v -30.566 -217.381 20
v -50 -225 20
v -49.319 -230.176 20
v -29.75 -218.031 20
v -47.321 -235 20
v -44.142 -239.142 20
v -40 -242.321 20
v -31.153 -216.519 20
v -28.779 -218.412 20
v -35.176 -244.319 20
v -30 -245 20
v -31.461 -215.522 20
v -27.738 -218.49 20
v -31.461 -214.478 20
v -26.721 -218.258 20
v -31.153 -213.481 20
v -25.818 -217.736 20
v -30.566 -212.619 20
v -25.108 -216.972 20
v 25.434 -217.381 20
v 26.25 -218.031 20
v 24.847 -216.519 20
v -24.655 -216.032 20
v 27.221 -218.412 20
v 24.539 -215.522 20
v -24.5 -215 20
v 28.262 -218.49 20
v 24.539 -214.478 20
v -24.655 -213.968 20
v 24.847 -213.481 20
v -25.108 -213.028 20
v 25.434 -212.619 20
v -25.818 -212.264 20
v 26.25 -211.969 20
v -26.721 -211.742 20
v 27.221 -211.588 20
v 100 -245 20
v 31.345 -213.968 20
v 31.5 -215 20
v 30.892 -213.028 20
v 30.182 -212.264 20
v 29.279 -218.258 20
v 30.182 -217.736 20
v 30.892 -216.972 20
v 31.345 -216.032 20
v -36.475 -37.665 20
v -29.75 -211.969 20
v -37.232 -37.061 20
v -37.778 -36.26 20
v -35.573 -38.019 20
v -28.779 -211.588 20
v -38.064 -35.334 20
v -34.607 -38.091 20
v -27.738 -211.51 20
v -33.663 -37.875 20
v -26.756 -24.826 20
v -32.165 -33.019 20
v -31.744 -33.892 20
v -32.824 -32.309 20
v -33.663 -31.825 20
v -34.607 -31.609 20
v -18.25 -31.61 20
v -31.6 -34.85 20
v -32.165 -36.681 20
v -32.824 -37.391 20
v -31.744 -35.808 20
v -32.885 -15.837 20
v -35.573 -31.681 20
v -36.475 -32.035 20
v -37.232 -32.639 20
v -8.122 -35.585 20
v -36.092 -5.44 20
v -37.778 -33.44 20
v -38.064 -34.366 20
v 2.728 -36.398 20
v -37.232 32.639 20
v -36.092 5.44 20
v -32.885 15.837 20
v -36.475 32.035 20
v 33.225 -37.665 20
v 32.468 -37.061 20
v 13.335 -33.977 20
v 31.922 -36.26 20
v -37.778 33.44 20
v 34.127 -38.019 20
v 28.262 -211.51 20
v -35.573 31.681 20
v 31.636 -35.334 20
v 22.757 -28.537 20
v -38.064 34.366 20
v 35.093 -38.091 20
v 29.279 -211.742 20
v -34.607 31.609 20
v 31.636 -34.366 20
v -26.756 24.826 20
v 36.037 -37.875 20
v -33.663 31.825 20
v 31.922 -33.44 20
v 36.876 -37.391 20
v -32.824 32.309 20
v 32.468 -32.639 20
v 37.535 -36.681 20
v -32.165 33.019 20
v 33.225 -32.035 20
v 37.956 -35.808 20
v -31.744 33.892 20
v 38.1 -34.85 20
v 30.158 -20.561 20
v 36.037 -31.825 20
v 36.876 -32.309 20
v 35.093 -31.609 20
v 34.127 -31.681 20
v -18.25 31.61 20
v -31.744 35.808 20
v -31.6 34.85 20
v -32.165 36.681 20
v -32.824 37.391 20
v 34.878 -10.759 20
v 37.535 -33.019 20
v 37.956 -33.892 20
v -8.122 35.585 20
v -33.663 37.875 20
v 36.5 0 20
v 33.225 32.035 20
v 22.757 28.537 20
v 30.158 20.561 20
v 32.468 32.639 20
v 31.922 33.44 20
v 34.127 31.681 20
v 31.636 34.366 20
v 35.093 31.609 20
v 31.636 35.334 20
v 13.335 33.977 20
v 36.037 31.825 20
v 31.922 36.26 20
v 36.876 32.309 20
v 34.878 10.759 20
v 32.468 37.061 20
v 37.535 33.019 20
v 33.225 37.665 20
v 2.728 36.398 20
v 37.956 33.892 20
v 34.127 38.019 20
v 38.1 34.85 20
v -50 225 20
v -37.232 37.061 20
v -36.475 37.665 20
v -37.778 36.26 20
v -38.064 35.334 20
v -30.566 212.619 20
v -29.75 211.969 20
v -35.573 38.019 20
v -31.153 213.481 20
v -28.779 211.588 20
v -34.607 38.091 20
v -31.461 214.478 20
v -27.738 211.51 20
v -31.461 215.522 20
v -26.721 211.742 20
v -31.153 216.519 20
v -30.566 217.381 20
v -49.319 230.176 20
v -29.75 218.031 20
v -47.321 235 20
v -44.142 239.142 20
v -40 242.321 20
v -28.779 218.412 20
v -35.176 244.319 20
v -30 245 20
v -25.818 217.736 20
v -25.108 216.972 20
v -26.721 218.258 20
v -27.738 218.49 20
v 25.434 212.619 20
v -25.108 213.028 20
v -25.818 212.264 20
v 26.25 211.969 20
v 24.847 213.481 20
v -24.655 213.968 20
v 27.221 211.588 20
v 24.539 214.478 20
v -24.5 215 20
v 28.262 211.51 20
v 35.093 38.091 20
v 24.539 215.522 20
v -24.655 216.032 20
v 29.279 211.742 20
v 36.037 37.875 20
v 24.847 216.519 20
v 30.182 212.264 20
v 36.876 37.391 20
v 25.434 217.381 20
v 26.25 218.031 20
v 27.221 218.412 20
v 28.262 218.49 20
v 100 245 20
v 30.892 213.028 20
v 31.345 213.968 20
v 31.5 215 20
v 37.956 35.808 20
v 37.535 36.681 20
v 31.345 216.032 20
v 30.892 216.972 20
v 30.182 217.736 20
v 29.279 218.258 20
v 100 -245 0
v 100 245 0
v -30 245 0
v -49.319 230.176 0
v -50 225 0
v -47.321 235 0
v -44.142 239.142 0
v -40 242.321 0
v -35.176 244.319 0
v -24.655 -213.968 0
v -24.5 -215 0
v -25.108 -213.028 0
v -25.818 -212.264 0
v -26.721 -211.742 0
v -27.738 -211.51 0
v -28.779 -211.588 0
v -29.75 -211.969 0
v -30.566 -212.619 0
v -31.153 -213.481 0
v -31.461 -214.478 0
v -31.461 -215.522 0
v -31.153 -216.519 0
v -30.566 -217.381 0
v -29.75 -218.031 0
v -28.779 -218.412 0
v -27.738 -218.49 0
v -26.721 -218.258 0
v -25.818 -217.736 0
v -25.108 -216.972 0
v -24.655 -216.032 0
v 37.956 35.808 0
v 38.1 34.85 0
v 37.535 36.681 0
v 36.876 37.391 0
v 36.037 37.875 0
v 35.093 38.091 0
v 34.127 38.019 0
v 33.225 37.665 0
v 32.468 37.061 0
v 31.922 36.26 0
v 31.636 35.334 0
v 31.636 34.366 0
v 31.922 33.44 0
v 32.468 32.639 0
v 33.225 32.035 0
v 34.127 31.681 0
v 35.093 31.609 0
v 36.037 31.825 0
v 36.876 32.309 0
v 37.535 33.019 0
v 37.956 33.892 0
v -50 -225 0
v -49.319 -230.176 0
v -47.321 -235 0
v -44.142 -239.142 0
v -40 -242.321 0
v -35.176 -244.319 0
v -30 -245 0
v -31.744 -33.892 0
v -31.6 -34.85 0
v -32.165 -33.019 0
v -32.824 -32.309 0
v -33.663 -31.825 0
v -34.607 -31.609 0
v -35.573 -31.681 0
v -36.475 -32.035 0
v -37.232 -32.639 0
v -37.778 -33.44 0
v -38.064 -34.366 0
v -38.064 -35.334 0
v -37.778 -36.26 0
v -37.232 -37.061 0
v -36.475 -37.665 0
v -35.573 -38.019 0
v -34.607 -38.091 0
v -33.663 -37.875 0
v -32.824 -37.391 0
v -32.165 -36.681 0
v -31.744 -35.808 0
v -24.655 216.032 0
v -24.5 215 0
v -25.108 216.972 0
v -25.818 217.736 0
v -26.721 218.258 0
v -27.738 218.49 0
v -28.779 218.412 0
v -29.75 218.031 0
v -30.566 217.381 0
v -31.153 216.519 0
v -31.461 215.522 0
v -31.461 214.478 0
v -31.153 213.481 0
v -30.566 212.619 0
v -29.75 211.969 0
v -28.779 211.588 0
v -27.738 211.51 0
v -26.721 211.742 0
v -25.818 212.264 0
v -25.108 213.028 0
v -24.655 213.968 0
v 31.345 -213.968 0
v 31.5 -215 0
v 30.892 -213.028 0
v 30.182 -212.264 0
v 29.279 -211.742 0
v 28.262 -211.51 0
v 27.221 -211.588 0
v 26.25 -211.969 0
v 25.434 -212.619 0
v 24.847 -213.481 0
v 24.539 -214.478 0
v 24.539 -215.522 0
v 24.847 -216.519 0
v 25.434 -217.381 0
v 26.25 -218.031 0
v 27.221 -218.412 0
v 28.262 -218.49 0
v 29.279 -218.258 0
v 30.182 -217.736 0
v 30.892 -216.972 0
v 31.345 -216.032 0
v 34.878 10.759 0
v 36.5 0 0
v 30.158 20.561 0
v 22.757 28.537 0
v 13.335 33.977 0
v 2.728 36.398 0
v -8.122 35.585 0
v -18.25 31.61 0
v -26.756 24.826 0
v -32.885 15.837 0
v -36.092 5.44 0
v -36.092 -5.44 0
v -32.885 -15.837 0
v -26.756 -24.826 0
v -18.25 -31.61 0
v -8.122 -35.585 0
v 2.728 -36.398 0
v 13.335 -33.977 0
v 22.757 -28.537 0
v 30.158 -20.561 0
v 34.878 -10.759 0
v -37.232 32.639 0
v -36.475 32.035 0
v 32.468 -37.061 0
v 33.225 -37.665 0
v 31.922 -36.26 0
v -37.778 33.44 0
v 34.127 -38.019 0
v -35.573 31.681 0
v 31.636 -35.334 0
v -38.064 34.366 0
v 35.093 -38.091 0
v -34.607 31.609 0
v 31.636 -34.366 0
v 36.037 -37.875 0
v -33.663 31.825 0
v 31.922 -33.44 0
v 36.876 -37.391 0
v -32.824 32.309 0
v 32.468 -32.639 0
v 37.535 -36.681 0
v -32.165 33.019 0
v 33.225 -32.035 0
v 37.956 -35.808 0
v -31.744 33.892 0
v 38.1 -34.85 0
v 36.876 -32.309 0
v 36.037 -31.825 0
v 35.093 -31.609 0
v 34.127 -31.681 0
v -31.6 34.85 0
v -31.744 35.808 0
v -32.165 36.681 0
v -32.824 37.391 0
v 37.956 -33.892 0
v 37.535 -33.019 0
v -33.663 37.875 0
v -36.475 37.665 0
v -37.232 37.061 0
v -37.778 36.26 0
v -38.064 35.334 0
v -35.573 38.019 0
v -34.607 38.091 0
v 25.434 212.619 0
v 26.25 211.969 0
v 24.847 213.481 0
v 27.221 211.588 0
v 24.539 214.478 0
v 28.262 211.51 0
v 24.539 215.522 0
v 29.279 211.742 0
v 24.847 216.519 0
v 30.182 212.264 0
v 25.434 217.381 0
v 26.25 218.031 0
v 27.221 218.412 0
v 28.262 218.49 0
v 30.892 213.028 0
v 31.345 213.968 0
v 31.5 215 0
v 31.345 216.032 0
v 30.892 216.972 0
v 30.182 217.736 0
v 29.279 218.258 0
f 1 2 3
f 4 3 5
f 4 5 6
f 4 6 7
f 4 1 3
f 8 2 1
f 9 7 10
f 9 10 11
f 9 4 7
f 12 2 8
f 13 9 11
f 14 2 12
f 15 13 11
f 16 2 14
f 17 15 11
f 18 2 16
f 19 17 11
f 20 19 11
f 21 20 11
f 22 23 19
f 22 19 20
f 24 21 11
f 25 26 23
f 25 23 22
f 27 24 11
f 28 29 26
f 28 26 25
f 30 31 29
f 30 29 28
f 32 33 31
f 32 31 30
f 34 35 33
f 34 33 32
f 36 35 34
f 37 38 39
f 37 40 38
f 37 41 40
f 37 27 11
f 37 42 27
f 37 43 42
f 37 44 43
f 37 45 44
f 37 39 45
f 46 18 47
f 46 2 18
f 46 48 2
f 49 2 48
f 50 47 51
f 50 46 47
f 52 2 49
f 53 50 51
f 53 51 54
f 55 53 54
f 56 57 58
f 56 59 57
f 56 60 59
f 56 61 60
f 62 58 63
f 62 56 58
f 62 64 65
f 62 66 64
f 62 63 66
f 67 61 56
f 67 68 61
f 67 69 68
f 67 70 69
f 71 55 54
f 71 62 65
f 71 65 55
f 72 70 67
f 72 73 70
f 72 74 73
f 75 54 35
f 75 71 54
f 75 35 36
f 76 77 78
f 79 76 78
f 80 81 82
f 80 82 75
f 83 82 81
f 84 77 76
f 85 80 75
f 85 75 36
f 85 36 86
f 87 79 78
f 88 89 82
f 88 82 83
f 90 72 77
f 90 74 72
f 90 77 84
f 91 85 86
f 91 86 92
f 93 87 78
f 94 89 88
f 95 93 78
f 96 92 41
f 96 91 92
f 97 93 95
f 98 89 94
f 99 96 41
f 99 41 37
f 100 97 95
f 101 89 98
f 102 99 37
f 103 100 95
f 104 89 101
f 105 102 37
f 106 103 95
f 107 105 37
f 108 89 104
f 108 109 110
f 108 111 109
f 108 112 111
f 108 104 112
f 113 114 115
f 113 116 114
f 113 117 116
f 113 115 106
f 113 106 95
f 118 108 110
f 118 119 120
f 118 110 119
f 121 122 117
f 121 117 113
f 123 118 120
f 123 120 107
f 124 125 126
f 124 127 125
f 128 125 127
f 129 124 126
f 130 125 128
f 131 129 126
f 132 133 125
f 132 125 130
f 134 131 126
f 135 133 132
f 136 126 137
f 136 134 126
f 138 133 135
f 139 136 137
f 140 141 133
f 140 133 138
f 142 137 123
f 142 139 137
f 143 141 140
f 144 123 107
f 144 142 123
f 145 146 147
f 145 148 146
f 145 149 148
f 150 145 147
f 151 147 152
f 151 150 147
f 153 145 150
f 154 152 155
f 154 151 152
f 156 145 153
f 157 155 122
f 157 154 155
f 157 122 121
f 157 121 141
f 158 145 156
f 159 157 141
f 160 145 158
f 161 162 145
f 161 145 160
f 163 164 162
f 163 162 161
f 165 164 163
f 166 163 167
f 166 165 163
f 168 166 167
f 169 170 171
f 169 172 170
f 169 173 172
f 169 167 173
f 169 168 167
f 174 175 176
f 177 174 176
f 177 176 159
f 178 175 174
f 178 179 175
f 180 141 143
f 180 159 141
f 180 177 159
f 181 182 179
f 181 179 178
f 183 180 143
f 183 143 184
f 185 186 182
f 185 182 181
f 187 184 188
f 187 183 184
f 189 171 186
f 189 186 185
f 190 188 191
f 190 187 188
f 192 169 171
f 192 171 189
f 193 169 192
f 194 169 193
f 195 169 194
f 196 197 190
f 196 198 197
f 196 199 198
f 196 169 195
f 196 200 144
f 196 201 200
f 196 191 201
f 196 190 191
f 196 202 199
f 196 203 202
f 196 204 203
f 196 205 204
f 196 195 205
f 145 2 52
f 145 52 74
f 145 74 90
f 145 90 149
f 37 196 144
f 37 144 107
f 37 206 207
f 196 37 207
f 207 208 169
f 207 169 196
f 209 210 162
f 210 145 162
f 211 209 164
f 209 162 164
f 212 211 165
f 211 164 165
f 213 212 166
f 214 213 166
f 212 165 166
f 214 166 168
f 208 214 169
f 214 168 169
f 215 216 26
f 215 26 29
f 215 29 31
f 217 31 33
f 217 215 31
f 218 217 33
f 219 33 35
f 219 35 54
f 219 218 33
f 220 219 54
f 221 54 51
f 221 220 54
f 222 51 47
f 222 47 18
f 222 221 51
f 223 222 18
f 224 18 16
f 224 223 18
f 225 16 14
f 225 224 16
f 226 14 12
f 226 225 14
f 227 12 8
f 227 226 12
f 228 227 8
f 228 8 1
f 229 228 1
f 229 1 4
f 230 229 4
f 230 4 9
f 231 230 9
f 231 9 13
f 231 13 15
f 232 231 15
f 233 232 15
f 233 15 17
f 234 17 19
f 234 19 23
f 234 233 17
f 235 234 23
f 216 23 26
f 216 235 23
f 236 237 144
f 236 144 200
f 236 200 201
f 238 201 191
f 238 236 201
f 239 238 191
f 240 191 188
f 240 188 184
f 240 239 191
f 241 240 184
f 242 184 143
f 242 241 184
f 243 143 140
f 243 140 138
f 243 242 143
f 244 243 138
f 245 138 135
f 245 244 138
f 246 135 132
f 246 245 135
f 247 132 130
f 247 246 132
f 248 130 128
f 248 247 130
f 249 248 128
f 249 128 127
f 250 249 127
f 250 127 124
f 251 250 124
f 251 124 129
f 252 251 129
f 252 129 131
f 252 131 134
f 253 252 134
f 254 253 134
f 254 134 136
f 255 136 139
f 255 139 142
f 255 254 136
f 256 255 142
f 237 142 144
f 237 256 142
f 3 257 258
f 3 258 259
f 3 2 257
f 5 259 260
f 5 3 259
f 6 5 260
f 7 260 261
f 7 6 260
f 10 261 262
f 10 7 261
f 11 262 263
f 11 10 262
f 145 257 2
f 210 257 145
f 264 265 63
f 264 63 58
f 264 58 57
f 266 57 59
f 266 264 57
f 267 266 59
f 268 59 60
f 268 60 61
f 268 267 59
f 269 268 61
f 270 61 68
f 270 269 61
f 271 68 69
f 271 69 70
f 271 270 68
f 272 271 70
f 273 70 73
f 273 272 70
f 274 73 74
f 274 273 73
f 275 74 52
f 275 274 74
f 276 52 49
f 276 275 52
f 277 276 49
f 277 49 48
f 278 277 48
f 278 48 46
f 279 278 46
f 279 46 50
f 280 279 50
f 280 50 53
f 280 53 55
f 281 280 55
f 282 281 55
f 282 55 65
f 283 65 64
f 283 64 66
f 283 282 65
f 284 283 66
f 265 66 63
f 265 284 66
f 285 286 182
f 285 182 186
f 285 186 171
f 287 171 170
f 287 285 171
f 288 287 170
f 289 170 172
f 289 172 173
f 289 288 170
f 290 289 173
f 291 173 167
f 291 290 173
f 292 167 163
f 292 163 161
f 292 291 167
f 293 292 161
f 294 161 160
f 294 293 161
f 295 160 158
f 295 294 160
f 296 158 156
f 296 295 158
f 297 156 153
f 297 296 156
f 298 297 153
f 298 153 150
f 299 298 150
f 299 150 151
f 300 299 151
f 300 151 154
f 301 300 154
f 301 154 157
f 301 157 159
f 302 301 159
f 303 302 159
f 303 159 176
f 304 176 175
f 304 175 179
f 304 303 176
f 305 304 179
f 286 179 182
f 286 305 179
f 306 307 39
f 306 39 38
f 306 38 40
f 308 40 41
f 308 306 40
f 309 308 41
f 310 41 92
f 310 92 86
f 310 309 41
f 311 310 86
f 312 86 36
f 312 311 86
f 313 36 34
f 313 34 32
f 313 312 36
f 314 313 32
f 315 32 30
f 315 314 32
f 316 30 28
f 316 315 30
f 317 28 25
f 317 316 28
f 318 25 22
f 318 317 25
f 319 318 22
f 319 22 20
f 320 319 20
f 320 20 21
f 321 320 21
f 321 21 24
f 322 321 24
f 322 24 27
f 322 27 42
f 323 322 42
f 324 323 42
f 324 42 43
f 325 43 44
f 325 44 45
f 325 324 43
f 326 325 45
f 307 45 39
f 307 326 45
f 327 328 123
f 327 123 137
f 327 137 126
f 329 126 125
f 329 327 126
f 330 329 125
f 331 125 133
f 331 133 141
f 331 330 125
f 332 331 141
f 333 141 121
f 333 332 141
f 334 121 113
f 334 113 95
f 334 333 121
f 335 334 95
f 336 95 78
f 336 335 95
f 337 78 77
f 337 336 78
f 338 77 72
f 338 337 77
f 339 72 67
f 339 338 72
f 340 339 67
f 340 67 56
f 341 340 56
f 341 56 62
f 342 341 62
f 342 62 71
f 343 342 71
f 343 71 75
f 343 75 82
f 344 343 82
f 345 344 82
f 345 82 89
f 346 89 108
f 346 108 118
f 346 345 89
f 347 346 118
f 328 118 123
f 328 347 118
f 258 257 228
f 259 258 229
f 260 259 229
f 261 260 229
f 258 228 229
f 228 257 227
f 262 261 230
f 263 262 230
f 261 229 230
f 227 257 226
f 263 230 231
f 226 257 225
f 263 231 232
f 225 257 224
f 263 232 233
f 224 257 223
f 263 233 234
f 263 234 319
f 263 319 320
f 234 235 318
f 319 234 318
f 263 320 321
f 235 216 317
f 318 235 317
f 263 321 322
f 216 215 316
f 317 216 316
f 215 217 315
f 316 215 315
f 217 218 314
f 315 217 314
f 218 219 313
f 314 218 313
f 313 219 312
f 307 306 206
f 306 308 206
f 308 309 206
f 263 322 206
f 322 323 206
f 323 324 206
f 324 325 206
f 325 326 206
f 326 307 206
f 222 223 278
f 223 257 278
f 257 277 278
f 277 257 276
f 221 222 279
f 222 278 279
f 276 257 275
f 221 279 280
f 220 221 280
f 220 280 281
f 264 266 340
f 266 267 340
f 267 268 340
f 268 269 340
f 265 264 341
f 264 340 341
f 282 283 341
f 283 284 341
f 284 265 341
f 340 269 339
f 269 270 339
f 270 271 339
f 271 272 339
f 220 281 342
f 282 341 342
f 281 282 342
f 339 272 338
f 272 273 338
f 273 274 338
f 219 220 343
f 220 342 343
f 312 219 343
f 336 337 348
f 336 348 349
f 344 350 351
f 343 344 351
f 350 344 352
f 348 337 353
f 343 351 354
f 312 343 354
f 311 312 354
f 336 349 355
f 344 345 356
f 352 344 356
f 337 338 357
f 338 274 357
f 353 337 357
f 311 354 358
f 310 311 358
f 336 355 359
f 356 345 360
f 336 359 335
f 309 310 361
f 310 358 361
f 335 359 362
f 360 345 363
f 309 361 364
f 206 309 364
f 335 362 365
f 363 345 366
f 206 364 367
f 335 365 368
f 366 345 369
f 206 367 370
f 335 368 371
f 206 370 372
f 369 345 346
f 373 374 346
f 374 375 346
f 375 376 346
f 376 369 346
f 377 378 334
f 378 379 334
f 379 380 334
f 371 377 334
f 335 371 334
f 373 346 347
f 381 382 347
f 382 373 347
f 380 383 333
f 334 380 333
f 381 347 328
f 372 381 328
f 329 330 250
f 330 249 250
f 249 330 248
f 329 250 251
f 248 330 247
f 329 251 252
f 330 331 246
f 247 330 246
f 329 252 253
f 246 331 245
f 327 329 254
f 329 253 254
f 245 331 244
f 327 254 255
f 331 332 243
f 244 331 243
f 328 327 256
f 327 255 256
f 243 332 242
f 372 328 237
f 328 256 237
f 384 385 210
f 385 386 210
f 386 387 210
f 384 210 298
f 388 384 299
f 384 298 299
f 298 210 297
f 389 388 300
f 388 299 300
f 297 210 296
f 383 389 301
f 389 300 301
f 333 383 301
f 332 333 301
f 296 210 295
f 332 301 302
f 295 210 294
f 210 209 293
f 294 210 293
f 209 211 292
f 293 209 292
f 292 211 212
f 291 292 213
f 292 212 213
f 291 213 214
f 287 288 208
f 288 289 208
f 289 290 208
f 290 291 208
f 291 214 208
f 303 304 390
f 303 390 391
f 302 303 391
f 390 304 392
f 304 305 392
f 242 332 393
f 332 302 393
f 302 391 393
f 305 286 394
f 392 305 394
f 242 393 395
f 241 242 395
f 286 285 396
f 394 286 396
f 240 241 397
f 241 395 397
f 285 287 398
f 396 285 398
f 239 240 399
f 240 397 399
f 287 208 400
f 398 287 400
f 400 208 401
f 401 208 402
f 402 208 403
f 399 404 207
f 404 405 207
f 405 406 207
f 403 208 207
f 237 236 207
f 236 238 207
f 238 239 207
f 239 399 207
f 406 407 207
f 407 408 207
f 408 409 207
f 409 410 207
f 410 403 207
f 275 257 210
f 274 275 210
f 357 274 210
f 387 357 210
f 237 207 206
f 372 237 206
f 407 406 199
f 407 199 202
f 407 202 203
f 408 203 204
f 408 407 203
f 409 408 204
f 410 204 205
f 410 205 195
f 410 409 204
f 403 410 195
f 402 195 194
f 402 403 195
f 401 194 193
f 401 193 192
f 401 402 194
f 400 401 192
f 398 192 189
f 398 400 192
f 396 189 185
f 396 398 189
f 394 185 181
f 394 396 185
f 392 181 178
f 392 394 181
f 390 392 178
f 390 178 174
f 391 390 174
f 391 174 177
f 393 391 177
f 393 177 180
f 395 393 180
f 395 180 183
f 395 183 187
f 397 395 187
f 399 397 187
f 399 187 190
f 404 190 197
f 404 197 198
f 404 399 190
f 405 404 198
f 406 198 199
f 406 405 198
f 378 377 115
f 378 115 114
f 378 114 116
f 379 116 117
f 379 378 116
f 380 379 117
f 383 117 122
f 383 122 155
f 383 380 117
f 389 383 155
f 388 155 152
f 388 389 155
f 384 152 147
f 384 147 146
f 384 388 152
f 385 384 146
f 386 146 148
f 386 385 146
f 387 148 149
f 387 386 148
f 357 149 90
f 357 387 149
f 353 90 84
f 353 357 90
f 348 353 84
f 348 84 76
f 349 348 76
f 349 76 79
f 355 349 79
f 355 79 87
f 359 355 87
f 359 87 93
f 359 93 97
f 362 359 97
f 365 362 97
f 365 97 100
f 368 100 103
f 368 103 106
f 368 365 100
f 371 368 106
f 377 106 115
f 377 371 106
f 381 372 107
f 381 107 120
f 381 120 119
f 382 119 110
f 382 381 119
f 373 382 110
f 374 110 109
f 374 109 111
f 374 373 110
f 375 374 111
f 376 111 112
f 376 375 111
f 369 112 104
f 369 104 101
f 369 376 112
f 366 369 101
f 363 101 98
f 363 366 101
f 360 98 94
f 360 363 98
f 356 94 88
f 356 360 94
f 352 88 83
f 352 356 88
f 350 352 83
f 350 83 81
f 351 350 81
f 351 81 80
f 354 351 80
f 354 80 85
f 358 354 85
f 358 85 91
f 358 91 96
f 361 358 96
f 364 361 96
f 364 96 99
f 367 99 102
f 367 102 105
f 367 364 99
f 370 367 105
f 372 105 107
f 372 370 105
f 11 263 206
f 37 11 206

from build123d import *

# Parameters (mm, degrees)
SKETCH_1_W      = 150
SKETCH_1_H      = 490
SKETCH_1_R      = 3.5
SKETCH_1_R_2    = 3.25
SKETCH_1_R_3    = 36.5
EXTRUDE_1_DEPTH = 20
FILLET_2_R      = 20


with BuildPart() as part:
    # Эскиз1 → Бобышка-Вытянуть1 (new body)
    with BuildSketch(Plane.XY):
        with Locations((25, 0)):
            Rectangle(SKETCH_1_W, SKETCH_1_H)
        with Locations((-28, -215)):
            Circle(SKETCH_1_R, mode=Mode.SUBTRACT)
        with Locations((-34.85, -34.85)):
            Circle(SKETCH_1_R_2, mode=Mode.SUBTRACT)
        with Locations((28, -215)):
            Circle(SKETCH_1_R, mode=Mode.SUBTRACT)
        with Locations((34.85, -34.85)):
            Circle(SKETCH_1_R_2, mode=Mode.SUBTRACT)
        with Locations((-34.85, 34.85)):
            Circle(SKETCH_1_R_2, mode=Mode.SUBTRACT)
        Circle(SKETCH_1_R_3, mode=Mode.SUBTRACT)
        with Locations((-28, 215)):
            Circle(SKETCH_1_R, mode=Mode.SUBTRACT)
        with Locations((34.85, 34.85)):
            Circle(SKETCH_1_R_2, mode=Mode.SUBTRACT)
        with Locations((28, 215)):
            Circle(SKETCH_1_R, mode=Mode.SUBTRACT)
    extrude(amount=EXTRUDE_1_DEPTH)

    # Скругление2
    fillet_2_edges = [part.edges().sort_by_distance(p)[0] for p in [
        (-50, -245, 10),
        (-50, 245, 10),
    ]]
    fillet(fillet_2_edges, radius=FILLET_2_R)


solid = part.part
